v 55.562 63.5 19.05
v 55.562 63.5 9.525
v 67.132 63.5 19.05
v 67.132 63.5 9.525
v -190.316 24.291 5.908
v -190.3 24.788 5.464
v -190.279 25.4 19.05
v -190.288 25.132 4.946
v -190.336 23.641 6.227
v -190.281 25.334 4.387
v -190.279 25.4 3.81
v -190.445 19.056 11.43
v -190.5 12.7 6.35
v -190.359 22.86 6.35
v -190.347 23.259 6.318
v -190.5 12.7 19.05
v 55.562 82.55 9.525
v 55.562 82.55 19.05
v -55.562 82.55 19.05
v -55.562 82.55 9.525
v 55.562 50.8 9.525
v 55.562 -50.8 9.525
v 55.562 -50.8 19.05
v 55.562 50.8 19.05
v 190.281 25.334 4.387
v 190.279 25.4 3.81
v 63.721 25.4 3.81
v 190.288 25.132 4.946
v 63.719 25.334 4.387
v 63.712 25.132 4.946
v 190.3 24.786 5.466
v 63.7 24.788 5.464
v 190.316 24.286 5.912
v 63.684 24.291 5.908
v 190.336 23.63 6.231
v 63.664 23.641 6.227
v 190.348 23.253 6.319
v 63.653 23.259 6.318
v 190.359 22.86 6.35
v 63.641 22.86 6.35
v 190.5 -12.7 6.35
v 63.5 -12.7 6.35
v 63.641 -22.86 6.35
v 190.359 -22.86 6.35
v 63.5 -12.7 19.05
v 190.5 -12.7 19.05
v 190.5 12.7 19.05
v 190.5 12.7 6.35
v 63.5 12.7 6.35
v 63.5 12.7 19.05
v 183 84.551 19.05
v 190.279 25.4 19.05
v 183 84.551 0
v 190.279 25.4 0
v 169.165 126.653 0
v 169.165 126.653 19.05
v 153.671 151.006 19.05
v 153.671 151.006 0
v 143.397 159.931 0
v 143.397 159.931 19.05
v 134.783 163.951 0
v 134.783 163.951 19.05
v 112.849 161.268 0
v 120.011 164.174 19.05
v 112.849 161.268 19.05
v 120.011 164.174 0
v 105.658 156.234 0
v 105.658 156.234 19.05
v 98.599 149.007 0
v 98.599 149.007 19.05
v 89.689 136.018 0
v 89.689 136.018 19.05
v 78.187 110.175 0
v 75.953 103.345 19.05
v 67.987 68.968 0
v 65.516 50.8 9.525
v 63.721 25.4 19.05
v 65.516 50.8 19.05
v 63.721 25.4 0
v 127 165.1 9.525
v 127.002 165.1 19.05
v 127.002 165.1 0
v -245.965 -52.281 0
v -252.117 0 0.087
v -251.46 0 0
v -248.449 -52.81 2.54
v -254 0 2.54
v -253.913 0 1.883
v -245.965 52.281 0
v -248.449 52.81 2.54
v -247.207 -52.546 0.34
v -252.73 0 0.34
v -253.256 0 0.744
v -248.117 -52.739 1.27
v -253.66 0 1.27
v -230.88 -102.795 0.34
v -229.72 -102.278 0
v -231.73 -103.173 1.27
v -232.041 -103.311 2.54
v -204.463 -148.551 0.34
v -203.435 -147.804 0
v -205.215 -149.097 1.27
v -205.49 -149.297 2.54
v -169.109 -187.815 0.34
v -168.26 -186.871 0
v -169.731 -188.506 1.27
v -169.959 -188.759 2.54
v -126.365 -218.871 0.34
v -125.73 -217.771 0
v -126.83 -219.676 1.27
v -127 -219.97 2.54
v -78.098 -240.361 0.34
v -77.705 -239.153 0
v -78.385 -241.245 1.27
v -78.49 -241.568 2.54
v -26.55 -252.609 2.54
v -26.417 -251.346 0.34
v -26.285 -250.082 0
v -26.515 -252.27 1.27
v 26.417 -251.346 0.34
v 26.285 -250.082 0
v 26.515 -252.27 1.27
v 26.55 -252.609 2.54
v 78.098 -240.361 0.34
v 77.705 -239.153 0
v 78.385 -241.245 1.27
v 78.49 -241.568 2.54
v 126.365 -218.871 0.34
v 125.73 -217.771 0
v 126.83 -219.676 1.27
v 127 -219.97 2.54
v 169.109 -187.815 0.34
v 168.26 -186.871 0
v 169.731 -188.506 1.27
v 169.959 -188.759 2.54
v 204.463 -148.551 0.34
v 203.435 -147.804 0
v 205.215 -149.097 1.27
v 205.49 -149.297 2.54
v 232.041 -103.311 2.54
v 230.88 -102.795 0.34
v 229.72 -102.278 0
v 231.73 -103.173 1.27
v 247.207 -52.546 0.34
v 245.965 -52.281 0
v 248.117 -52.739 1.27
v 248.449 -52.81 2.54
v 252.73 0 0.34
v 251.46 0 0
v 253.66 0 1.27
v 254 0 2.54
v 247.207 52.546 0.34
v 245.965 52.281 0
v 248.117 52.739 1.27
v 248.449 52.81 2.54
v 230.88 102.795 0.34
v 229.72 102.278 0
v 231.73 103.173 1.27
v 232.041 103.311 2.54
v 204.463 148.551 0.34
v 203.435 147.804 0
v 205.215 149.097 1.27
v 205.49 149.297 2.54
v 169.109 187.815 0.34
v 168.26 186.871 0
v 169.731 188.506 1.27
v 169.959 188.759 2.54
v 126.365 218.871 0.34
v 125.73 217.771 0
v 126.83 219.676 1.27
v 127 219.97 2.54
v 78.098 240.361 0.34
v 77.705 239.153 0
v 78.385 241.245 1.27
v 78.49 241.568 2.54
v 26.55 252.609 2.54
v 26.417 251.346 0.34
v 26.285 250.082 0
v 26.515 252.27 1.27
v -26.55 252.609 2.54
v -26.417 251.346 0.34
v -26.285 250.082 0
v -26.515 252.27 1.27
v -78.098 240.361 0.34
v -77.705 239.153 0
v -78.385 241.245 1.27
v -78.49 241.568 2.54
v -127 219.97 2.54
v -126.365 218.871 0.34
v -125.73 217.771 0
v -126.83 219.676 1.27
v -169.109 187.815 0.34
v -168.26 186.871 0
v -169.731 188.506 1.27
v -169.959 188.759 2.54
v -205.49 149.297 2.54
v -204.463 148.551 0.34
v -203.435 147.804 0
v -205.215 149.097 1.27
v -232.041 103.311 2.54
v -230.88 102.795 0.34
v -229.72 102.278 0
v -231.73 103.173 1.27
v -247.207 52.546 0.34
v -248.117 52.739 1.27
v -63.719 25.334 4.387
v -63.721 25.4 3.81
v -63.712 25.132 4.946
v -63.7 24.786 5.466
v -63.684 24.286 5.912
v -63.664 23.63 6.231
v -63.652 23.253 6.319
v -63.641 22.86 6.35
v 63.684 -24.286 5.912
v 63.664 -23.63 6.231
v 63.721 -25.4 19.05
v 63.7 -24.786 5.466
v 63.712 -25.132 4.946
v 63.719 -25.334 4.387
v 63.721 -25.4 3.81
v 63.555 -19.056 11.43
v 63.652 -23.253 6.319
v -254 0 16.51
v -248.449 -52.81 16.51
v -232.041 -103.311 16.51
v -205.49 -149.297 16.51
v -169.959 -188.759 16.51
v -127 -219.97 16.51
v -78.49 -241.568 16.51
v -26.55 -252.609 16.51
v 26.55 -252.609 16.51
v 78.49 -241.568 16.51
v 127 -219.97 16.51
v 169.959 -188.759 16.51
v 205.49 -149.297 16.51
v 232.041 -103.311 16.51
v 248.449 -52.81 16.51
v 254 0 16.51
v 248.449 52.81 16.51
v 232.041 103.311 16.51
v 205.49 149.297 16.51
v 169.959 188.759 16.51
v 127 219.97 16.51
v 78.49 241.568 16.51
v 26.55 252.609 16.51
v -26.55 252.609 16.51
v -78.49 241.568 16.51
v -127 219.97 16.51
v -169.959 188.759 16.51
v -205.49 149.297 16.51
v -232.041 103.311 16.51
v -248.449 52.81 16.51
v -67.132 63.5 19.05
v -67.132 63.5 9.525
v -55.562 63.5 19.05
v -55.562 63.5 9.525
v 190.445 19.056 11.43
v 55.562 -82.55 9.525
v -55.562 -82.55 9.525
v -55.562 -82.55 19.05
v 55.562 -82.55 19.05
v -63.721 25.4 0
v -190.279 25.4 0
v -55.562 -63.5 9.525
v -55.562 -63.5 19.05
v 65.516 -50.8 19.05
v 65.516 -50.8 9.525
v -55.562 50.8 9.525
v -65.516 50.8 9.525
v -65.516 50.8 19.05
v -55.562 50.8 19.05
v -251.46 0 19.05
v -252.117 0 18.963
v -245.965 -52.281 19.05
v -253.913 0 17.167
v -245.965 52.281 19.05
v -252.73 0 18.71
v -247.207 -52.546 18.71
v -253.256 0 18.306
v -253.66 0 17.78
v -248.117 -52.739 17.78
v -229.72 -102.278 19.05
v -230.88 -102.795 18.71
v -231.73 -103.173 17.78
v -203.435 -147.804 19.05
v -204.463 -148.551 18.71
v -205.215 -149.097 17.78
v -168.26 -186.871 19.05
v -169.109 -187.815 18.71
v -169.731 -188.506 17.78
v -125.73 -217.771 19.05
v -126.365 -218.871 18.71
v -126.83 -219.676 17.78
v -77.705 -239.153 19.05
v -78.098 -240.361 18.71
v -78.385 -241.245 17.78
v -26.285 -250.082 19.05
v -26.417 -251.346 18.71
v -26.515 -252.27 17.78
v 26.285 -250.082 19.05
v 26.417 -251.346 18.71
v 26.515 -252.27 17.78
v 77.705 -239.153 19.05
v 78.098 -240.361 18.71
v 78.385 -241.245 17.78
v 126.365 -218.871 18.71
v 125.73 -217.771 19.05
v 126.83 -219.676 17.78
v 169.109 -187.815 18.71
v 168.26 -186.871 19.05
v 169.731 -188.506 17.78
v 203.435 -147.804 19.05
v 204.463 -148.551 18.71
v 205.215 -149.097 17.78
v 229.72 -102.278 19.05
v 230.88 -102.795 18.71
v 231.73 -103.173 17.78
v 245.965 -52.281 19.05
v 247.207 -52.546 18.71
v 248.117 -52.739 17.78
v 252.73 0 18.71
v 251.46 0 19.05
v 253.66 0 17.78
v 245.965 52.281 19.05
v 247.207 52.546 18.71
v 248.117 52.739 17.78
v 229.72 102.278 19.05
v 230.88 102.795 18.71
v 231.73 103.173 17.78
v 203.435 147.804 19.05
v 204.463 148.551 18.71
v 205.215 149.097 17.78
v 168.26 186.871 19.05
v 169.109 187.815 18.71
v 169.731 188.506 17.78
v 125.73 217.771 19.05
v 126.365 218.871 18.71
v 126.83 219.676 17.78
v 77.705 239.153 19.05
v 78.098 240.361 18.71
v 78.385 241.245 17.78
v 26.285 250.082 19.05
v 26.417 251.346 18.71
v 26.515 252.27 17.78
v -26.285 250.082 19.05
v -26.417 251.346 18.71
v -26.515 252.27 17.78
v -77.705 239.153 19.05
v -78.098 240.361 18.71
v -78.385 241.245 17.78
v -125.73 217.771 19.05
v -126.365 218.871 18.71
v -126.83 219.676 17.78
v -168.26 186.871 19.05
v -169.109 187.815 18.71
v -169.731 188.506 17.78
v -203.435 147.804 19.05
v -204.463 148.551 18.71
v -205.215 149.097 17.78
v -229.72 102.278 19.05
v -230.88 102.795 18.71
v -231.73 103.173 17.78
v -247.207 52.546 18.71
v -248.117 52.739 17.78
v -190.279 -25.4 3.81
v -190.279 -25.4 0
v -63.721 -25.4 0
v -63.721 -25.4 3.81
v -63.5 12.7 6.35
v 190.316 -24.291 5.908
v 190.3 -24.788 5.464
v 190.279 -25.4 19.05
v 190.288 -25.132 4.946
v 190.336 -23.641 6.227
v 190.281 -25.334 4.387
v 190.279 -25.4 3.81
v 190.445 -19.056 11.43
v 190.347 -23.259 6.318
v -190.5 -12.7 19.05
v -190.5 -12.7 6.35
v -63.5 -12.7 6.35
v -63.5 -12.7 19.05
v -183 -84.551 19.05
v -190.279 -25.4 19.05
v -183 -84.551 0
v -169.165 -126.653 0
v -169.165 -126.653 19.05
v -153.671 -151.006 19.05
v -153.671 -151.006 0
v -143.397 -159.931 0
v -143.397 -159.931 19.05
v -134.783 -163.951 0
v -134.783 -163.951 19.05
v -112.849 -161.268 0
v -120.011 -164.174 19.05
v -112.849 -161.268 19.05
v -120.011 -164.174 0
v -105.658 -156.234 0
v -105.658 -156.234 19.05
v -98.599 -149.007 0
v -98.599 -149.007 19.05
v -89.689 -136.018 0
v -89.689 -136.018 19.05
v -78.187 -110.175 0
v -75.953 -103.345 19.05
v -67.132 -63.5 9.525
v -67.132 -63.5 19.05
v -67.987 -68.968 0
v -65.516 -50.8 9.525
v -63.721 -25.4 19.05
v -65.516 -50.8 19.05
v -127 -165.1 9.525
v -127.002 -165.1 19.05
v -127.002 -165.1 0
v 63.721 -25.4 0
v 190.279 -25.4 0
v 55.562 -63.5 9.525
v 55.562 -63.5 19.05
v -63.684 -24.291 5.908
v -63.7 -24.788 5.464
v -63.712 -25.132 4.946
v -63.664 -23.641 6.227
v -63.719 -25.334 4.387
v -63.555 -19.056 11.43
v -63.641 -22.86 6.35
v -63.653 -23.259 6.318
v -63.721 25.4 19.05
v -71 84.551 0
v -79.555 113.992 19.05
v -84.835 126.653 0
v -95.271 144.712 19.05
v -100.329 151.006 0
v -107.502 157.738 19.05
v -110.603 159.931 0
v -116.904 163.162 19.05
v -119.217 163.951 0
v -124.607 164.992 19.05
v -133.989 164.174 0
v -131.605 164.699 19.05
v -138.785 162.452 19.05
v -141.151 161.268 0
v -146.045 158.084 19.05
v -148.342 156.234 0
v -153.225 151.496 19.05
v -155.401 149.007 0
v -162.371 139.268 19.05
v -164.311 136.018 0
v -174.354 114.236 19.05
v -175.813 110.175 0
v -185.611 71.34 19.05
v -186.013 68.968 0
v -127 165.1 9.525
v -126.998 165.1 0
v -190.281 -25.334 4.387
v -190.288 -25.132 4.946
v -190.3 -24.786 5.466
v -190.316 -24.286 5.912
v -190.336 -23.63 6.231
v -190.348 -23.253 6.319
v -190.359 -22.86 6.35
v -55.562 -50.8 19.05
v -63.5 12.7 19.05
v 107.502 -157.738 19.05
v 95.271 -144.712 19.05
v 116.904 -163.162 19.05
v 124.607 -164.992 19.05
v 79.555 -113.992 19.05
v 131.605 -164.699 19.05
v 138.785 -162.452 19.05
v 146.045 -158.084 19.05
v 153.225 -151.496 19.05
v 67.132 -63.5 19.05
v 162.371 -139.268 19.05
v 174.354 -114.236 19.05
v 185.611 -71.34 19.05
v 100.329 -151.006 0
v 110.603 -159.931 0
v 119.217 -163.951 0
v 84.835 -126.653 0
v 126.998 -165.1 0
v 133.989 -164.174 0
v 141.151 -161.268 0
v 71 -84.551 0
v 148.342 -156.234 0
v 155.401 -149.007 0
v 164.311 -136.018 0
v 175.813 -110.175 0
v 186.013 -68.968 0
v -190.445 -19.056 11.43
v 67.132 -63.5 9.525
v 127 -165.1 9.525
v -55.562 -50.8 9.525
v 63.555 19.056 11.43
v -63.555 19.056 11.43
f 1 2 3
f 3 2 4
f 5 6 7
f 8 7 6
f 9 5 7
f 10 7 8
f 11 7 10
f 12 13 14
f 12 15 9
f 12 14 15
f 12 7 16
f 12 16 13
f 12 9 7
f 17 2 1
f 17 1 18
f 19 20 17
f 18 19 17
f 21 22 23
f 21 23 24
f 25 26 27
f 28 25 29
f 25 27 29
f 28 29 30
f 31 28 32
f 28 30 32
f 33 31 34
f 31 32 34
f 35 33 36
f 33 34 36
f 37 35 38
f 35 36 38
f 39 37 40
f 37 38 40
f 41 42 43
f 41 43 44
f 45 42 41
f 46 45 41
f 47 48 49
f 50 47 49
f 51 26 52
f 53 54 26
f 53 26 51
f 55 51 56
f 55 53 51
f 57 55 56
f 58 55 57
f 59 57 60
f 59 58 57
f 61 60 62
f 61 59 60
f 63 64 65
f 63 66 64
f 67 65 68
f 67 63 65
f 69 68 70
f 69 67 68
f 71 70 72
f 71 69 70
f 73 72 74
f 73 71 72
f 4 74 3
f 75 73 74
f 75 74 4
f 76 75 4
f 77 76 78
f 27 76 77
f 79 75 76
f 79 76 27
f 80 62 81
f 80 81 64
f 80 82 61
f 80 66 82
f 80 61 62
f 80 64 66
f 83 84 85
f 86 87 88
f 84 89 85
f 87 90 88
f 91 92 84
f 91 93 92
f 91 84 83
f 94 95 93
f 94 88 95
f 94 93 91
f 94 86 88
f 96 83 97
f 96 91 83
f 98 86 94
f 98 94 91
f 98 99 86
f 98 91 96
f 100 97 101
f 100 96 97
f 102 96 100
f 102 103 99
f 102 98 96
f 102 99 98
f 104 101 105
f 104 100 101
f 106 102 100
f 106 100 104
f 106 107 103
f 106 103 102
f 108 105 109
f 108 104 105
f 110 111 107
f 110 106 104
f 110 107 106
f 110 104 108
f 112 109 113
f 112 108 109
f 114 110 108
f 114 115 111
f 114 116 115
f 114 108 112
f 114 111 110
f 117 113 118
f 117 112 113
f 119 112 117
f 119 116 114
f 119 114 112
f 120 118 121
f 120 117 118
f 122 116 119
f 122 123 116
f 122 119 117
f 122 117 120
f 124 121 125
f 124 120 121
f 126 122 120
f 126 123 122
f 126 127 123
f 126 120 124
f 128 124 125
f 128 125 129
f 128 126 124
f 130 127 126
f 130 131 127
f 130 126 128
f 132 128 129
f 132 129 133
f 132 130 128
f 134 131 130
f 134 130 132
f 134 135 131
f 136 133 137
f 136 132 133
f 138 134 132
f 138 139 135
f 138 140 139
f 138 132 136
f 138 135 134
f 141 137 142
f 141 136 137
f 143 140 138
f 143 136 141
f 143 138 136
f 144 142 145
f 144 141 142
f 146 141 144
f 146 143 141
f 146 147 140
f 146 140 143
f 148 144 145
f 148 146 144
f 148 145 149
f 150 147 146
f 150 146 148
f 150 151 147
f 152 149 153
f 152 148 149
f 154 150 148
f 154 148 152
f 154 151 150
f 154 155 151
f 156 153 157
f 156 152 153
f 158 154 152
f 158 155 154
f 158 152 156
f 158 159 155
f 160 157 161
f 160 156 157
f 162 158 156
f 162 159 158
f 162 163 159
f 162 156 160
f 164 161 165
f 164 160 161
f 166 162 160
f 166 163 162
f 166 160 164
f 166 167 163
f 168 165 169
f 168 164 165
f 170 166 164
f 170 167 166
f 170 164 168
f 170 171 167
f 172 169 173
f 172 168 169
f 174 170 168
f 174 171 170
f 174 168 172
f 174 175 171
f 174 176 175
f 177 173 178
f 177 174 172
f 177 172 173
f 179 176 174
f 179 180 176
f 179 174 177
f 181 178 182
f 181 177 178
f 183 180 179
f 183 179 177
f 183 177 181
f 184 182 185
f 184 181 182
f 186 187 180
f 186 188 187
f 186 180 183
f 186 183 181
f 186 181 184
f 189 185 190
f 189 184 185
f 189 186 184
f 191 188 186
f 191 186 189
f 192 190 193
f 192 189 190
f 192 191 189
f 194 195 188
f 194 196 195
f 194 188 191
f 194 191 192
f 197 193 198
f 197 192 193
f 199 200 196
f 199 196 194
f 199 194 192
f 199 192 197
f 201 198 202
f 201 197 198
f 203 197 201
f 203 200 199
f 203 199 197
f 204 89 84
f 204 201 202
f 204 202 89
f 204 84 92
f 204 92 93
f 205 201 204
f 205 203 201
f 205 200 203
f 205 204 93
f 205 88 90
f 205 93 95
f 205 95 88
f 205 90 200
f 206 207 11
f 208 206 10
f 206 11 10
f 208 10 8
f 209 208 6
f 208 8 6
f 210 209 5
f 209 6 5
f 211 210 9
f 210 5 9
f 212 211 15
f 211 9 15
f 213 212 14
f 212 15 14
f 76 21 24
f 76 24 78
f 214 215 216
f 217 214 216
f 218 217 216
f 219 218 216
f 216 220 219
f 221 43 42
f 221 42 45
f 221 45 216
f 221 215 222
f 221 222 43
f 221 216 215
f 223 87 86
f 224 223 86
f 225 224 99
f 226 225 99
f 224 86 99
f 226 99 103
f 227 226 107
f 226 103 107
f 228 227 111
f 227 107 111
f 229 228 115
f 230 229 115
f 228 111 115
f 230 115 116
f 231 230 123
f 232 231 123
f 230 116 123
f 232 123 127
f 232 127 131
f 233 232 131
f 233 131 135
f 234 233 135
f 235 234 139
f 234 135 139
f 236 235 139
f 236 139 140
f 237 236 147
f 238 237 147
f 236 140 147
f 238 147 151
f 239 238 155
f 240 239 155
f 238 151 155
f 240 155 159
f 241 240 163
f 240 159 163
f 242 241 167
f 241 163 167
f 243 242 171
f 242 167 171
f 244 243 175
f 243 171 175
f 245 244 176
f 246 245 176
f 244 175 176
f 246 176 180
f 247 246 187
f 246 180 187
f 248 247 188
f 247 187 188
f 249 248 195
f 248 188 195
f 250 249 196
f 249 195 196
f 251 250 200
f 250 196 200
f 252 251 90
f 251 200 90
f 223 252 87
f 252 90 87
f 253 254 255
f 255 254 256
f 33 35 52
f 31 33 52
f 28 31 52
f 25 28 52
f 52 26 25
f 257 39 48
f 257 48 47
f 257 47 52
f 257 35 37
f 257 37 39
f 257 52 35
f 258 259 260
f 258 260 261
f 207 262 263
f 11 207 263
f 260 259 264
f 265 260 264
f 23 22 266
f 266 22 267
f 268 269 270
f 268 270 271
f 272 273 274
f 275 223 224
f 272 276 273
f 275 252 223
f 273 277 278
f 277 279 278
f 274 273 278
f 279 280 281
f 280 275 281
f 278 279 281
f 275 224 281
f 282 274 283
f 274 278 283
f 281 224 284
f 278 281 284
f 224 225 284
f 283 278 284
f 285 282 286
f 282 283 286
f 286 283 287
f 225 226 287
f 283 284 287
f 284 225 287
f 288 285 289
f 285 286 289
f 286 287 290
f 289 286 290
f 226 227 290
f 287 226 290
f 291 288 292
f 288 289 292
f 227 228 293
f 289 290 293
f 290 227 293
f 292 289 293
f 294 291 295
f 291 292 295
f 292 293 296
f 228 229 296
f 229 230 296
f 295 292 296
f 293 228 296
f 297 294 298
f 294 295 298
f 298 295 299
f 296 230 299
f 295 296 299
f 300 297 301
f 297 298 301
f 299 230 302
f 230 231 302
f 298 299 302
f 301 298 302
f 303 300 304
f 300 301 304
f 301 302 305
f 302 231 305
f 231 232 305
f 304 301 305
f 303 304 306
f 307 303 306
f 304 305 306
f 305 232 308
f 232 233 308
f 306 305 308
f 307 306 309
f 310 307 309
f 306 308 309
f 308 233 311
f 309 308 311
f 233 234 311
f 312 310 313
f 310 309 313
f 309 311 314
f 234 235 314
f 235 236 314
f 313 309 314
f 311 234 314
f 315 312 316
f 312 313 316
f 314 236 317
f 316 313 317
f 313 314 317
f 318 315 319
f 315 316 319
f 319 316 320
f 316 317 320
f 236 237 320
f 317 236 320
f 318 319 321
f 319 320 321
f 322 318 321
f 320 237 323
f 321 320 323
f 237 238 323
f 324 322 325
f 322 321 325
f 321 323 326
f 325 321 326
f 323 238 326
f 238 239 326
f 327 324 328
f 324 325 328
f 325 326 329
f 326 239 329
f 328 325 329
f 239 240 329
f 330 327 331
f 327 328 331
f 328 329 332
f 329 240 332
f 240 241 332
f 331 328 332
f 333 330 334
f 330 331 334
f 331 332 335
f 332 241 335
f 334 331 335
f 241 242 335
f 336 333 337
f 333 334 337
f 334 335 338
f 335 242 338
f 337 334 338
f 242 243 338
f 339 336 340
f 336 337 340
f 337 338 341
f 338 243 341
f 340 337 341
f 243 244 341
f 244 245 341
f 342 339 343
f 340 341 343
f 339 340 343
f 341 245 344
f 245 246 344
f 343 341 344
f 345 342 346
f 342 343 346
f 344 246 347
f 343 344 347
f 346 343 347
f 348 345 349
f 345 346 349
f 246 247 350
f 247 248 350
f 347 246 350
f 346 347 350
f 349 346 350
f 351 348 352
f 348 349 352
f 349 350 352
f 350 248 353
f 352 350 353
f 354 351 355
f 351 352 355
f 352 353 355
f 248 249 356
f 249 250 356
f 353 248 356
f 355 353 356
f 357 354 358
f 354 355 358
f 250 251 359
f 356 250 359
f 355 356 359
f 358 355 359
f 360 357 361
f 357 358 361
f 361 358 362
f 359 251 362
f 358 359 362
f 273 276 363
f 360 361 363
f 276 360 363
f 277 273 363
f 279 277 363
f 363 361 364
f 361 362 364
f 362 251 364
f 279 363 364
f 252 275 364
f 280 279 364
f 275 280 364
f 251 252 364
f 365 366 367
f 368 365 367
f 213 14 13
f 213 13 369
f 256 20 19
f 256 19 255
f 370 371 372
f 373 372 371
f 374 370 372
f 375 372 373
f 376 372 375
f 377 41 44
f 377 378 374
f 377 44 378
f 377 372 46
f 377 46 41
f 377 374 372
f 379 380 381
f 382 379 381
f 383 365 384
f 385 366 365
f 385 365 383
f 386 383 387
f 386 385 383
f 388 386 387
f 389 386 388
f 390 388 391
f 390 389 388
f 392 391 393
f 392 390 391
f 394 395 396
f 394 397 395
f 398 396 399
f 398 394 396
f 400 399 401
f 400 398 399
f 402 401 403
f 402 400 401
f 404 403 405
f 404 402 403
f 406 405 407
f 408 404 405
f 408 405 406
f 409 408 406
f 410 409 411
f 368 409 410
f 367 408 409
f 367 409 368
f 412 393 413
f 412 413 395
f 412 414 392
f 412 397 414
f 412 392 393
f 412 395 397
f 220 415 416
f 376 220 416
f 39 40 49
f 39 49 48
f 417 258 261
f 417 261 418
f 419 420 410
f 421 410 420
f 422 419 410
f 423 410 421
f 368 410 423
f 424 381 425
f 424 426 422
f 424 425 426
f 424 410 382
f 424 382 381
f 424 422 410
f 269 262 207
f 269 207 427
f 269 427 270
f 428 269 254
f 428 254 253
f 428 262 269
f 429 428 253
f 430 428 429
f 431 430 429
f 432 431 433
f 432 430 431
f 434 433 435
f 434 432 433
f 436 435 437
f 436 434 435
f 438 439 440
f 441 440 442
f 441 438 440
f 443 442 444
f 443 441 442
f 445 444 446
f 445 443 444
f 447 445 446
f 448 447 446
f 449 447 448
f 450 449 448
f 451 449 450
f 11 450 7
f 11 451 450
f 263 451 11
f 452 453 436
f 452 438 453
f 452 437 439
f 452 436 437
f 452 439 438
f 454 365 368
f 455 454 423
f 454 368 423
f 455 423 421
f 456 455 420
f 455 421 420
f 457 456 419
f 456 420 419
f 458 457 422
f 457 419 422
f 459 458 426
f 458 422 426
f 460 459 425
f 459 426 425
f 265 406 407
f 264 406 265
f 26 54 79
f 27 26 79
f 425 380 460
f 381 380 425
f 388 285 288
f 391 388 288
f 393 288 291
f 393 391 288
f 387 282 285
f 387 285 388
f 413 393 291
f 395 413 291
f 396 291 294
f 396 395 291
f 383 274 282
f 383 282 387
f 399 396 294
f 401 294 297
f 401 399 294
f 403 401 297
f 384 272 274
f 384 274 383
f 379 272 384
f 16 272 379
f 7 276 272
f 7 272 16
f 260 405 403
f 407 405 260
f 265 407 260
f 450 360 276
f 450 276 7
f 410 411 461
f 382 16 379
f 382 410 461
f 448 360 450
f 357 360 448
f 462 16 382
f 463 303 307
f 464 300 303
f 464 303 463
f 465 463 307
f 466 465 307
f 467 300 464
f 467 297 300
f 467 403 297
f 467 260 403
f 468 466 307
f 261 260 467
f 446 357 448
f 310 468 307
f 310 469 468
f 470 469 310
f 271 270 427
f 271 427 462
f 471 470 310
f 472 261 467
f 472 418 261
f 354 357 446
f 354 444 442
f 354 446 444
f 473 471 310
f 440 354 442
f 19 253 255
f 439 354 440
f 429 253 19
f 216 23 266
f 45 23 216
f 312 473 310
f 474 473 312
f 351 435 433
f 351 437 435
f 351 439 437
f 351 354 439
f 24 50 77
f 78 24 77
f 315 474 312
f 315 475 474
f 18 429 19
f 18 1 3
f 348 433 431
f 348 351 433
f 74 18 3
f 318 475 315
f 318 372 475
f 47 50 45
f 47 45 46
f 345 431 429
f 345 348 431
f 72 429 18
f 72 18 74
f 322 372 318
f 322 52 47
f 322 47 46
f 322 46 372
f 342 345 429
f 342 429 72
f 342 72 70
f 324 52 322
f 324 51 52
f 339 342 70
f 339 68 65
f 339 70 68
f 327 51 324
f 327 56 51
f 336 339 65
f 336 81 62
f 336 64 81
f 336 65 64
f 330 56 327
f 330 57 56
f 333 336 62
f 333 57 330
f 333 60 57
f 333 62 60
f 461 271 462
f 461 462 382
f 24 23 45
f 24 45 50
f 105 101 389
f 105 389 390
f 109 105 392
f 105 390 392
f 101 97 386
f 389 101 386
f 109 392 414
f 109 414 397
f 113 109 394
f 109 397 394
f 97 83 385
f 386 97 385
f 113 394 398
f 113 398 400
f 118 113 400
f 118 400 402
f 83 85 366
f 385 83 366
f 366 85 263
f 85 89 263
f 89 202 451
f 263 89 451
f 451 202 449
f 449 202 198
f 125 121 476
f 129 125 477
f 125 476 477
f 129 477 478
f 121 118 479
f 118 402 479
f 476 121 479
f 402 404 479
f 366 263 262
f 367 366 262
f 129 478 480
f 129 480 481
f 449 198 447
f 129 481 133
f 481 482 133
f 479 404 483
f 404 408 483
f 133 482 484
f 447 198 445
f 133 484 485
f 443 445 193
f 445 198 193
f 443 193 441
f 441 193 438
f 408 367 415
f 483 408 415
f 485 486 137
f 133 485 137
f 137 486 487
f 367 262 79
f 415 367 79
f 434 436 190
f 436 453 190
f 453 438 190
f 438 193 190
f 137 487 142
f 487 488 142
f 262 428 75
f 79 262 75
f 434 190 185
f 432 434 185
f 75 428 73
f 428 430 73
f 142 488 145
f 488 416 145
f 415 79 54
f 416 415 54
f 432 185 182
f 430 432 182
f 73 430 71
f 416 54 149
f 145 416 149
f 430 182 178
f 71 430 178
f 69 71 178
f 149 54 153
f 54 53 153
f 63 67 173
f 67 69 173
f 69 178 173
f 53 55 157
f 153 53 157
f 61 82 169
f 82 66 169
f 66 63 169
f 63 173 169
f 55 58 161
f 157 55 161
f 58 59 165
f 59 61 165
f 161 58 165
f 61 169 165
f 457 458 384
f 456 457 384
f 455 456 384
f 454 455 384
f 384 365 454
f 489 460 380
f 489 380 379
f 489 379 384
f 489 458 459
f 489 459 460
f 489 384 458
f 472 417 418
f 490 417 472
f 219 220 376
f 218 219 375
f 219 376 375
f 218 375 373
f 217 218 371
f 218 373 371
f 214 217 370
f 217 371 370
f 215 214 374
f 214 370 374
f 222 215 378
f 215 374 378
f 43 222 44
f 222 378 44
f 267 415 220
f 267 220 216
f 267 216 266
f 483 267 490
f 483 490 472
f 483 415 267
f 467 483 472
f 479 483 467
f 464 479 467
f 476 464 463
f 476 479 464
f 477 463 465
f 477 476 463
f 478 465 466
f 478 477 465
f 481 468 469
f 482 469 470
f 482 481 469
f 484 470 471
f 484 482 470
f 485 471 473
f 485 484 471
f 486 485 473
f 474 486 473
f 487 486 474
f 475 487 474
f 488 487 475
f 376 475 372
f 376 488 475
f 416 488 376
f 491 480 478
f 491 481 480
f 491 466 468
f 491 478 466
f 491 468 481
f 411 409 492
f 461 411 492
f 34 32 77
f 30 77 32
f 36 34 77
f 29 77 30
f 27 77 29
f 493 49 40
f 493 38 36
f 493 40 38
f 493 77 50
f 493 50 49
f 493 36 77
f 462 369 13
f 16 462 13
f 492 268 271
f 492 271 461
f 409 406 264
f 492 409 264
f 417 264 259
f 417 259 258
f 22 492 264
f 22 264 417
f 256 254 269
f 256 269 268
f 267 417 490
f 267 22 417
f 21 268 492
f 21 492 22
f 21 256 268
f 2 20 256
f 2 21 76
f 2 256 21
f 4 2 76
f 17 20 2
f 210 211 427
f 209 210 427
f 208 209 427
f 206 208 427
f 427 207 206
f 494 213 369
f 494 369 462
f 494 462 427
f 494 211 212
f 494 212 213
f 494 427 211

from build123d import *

# Parameters (mm, degrees)
F1_DEPTH = 19.05
F2_DEPTH = 6.35
F4_R     = 2.54
F5_START = 9.525
F3_W     = 111.125
F3_H     = 19.05
F3_H_2   = 12.7
F3_W_2   = 46.0375
F5_DEPTH = 9.525


# Not quite as in the source:
# - two fillets or chamfers of one size are made in one step


with BuildPart() as f1:
    # F0 (on Top) → F1 (new body)
    with BuildSketch(Plane.XY):
        with BuildLine():
            Line((0, 0), (254, 0))
            ThreePointArc((254, 0), (179.6051224214, 179.6051224214), (0, 254))
            Line((0, 254), (0, 0))
        make_face()
        with BuildLine():
            add(Edge.make_bspline(
                [(190.5, 12.7), (190.5, 19.0610627513), (190.2791297656, 25.4)],
                knots=[1.5707963268, 1.5707963268, 1.5707963268, 1.6542264134, 1.6542264134, 1.6542264134], degree=2, weights=[1, 0.9991300537, 1]))
            Line((190.5, 12.7), (63.5, 12.7))
            add(Edge.make_bspline(
                [(63.7208702344, 25.4), (63.5, 19.0610627513), (63.5, 12.7)],
                knots=[4.6289588938, 4.6289588938, 4.6289588938, 4.7123889804, 4.7123889804, 4.7123889804], degree=2, weights=[1, 0.9991300537, 1]))
            add(Edge.make_bspline(
                [(190.2791297656, 25.4), (185.411504399, 165.1), (127, 165.1), (68.588495601, 165.1), (63.7208702344, 25.4)],
                knots=[1.6542264134, 1.6542264134, 1.6542264134, 3.1415926536, 3.1415926536, 4.6289588938, 4.6289588938, 4.6289588938], degree=2, weights=[1, 0.7359800722, 1, 0.7359800722, 1]))
        make_face(mode=Mode.SUBTRACT)
        with BuildLine():
            ThreePointArc((0, -254), (179.6051224214, -179.6051224214), (254, 0))
            Line((254, 0), (0, 0))
            Line((0, 0), (0, -254))
        make_face()
        with BuildLine():
            add(Edge.make_bspline(
                [(63.5, -12.7), (63.5, -19.0610627513), (63.7208702344, -25.4)],
                knots=[1.5707963268, 1.5707963268, 1.5707963268, 1.6542264134, 1.6542264134, 1.6542264134], degree=2, weights=[1, 0.9991300537, 1]))
            Line((63.5, -12.7), (190.5, -12.7))
            add(Edge.make_bspline(
                [(190.2791297656, -25.4), (190.5, -19.0610627513), (190.5, -12.7)],
                knots=[4.6289588938, 4.6289588938, 4.6289588938, 4.7123889804, 4.7123889804, 4.7123889804], degree=2, weights=[1, 0.9991300537, 1]))
            add(Edge.make_bspline(
                [(63.7208702344, -25.4), (68.588495601, -165.1), (127, -165.1), (185.411504399, -165.1), (190.2791297656, -25.4)],
                knots=[1.6542264134, 1.6542264134, 1.6542264134, 3.1415926536, 3.1415926536, 4.6289588938, 4.6289588938, 4.6289588938], degree=2, weights=[1, 0.7359800722, 1, 0.7359800722, 1]))
        make_face(mode=Mode.SUBTRACT)
        with BuildLine():
            Line((0, 0), (0, 254))
            ThreePointArc((0, 254), (-179.6051224214, 179.6051224214), (-254, 0))
            Line((-254, 0), (0, 0))
        make_face()
        with BuildLine():
            add(Edge.make_bspline(
                [(-63.5, 12.7), (-63.5, 19.0610627513), (-63.7208702344, 25.4)],
                knots=[1.5707963268, 1.5707963268, 1.5707963268, 1.6542264134, 1.6542264134, 1.6542264134], degree=2, weights=[1, 0.9991300537, 1]))
            Line((-63.5, 12.7), (-190.5, 12.7))
            add(Edge.make_bspline(
                [(-190.2791297656, 25.4), (-190.5, 19.0610627513), (-190.5, 12.7)],
                knots=[4.6289588938, 4.6289588938, 4.6289588938, 4.7123889804, 4.7123889804, 4.7123889804], degree=2, weights=[1, 0.9991300537, 1]))
            add(Edge.make_bspline(
                [(-63.7208702344, 25.4), (-68.588495601, 165.1), (-127, 165.1), (-185.411504399, 165.1), (-190.2791297656, 25.4)],
                knots=[1.6542264134, 1.6542264134, 1.6542264134, 3.1415926536, 3.1415926536, 4.6289588938, 4.6289588938, 4.6289588938], degree=2, weights=[1, 0.7359800722, 1, 0.7359800722, 1]))
        make_face(mode=Mode.SUBTRACT)
        with BuildLine():
            ThreePointArc((-254, 0), (-179.6051224214, -179.6051224214), (0, -254))
            Line((0, -254), (0, 0))
            Line((0, 0), (-254, 0))
        make_face()
        with BuildLine():
            add(Edge.make_bspline(
                [(-190.5, -12.7), (-190.5, -19.0610627513), (-190.2791297656, -25.4)],
                knots=[1.5707963268, 1.5707963268, 1.5707963268, 1.6542264134, 1.6542264134, 1.6542264134], degree=2, weights=[1, 0.9991300537, 1]))
            Line((-190.5, -12.7), (-63.5, -12.7))
            add(Edge.make_bspline(
                [(-63.7208702344, -25.4), (-63.5, -19.0610627513), (-63.5, -12.7)],
                knots=[4.6289588938, 4.6289588938, 4.6289588938, 4.7123889804, 4.7123889804, 4.7123889804], degree=2, weights=[1, 0.9991300537, 1]))
            add(Edge.make_bspline(
                [(-190.2791297656, -25.4), (-185.411504399, -165.1), (-127, -165.1), (-68.588495601, -165.1), (-63.7208702344, -25.4)],
                knots=[1.6542264134, 1.6542264134, 1.6542264134, 3.1415926536, 3.1415926536, 4.6289588938, 4.6289588938, 4.6289588938], degree=2, weights=[1, 0.7359800722, 1, 0.7359800722, 1]))
        make_face(mode=Mode.SUBTRACT)
    extrude(amount=F1_DEPTH)

    # F0 (on Top) → F2 (join)
    with BuildSketch(Plane.XY):
        with BuildLine():
            Line((63.5, 12.7), (190.5, 12.7))
            add(Edge.make_bspline(
                [(190.5, 12.7), (190.5, 19.0610627513), (190.2791297656, 25.4)],
                knots=[1.5707963268, 1.5707963268, 1.5707963268, 1.6542264134, 1.6542264134, 1.6542264134], degree=2, weights=[1, 0.9991300537, 1]))
            Line((190.2791297656, 25.4), (63.7208702344, 25.4))
            add(Edge.make_bspline(
                [(63.7208702344, 25.4), (63.5, 19.0610627513), (63.5, 12.7)],
                knots=[4.6289588938, 4.6289588938, 4.6289588938, 4.7123889804, 4.7123889804, 4.7123889804], degree=2, weights=[1, 0.9991300537, 1]))
        make_face()
        with BuildLine():
            Line((190.5, -12.7), (63.5, -12.7))
            add(Edge.make_bspline(
                [(63.5, -12.7), (63.5, -19.0610627513), (63.7208702344, -25.4)],
                knots=[1.5707963268, 1.5707963268, 1.5707963268, 1.6542264134, 1.6542264134, 1.6542264134], degree=2, weights=[1, 0.9991300537, 1]))
            Line((63.7208702344, -25.4), (190.2791297656, -25.4))
            add(Edge.make_bspline(
                [(190.2791297656, -25.4), (190.5, -19.0610627513), (190.5, -12.7)],
                knots=[4.6289588938, 4.6289588938, 4.6289588938, 4.7123889804, 4.7123889804, 4.7123889804], degree=2, weights=[1, 0.9991300537, 1]))
        make_face()
        with BuildLine():
            Line((-63.5, -12.7), (-190.5, -12.7))
            add(Edge.make_bspline(
                [(-190.5, -12.7), (-190.5, -19.0610627513), (-190.2791297656, -25.4)],
                knots=[1.5707963268, 1.5707963268, 1.5707963268, 1.6542264134, 1.6542264134, 1.6542264134], degree=2, weights=[1, 0.9991300537, 1]))
            Line((-190.2791297656, -25.4), (-63.7208702344, -25.4))
            add(Edge.make_bspline(
                [(-63.7208702344, -25.4), (-63.5, -19.0610627513), (-63.5, -12.7)],
                knots=[4.6289588938, 4.6289588938, 4.6289588938, 4.7123889804, 4.7123889804, 4.7123889804], degree=2, weights=[1, 0.9991300537, 1]))
        make_face()
        with BuildLine():
            Line((-190.5, 12.7), (-63.5, 12.7))
            add(Edge.make_bspline(
                [(-63.5, 12.7), (-63.5, 19.0610627513), (-63.7208702344, 25.4)],
                knots=[1.5707963268, 1.5707963268, 1.5707963268, 1.6542264134, 1.6542264134, 1.6542264134], degree=2, weights=[1, 0.9991300537, 1]))
            Line((-63.7208702344, 25.4), (-190.2791297656, 25.4))
            add(Edge.make_bspline(
                [(-190.2791297656, 25.4), (-190.5, 19.0610627513), (-190.5, 12.7)],
                knots=[4.6289588938, 4.6289588938, 4.6289588938, 4.7123889804, 4.7123889804, 4.7123889804], degree=2, weights=[1, 0.9991300537, 1]))
        make_face()
    extrude(amount=F2_DEPTH)

    # F4
    f4_edges = [f1.edges().sort_by_distance(p)[0] for p in [
        (254, 0, 19.05),
        (-127, -25.4, 6.35),
        (127, -25.4, 6.35),
        (127, 25.4, 6.35),
        (-127, 25.4, 6.35),
        (254, 0, 0),
    ]]
    fillet(f4_edges, radius=F4_R)

    # F3 (on Top) → F5 (cut)
    with BuildSketch(Plane.XY.offset(F5_START)):
        with Locations((0, 73.025)):
            Rectangle(F3_W, F3_H)
        with Locations((0, 57.15)):
            Rectangle(F3_W, F3_H_2)
        with Locations((-78.58125, 57.15)):
            Rectangle(F3_W_2, F3_H_2)
        with Locations((78.58125, 57.15)):
            Rectangle(F3_W_2, F3_H_2)
        Polygon((55.5625, 50.8), (-55.5625, 50.8), (-55.5625, -50.8), (55.5625, -50.8), (55.5625, 0), align=None)
        with Locations((0, -57.15)):
            Rectangle(F3_W, F3_H_2)
        with Locations((-78.58125, -57.15)):
            Rectangle(F3_W_2, F3_H_2)
        with Locations((0, -73.025)):
            Rectangle(F3_W, F3_H)
        with Locations((78.58125, -57.15)):
            Rectangle(F3_W_2, F3_H_2)
    extrude(amount=F5_DEPTH, mode=Mode.SUBTRACT)


solid = f1.part
